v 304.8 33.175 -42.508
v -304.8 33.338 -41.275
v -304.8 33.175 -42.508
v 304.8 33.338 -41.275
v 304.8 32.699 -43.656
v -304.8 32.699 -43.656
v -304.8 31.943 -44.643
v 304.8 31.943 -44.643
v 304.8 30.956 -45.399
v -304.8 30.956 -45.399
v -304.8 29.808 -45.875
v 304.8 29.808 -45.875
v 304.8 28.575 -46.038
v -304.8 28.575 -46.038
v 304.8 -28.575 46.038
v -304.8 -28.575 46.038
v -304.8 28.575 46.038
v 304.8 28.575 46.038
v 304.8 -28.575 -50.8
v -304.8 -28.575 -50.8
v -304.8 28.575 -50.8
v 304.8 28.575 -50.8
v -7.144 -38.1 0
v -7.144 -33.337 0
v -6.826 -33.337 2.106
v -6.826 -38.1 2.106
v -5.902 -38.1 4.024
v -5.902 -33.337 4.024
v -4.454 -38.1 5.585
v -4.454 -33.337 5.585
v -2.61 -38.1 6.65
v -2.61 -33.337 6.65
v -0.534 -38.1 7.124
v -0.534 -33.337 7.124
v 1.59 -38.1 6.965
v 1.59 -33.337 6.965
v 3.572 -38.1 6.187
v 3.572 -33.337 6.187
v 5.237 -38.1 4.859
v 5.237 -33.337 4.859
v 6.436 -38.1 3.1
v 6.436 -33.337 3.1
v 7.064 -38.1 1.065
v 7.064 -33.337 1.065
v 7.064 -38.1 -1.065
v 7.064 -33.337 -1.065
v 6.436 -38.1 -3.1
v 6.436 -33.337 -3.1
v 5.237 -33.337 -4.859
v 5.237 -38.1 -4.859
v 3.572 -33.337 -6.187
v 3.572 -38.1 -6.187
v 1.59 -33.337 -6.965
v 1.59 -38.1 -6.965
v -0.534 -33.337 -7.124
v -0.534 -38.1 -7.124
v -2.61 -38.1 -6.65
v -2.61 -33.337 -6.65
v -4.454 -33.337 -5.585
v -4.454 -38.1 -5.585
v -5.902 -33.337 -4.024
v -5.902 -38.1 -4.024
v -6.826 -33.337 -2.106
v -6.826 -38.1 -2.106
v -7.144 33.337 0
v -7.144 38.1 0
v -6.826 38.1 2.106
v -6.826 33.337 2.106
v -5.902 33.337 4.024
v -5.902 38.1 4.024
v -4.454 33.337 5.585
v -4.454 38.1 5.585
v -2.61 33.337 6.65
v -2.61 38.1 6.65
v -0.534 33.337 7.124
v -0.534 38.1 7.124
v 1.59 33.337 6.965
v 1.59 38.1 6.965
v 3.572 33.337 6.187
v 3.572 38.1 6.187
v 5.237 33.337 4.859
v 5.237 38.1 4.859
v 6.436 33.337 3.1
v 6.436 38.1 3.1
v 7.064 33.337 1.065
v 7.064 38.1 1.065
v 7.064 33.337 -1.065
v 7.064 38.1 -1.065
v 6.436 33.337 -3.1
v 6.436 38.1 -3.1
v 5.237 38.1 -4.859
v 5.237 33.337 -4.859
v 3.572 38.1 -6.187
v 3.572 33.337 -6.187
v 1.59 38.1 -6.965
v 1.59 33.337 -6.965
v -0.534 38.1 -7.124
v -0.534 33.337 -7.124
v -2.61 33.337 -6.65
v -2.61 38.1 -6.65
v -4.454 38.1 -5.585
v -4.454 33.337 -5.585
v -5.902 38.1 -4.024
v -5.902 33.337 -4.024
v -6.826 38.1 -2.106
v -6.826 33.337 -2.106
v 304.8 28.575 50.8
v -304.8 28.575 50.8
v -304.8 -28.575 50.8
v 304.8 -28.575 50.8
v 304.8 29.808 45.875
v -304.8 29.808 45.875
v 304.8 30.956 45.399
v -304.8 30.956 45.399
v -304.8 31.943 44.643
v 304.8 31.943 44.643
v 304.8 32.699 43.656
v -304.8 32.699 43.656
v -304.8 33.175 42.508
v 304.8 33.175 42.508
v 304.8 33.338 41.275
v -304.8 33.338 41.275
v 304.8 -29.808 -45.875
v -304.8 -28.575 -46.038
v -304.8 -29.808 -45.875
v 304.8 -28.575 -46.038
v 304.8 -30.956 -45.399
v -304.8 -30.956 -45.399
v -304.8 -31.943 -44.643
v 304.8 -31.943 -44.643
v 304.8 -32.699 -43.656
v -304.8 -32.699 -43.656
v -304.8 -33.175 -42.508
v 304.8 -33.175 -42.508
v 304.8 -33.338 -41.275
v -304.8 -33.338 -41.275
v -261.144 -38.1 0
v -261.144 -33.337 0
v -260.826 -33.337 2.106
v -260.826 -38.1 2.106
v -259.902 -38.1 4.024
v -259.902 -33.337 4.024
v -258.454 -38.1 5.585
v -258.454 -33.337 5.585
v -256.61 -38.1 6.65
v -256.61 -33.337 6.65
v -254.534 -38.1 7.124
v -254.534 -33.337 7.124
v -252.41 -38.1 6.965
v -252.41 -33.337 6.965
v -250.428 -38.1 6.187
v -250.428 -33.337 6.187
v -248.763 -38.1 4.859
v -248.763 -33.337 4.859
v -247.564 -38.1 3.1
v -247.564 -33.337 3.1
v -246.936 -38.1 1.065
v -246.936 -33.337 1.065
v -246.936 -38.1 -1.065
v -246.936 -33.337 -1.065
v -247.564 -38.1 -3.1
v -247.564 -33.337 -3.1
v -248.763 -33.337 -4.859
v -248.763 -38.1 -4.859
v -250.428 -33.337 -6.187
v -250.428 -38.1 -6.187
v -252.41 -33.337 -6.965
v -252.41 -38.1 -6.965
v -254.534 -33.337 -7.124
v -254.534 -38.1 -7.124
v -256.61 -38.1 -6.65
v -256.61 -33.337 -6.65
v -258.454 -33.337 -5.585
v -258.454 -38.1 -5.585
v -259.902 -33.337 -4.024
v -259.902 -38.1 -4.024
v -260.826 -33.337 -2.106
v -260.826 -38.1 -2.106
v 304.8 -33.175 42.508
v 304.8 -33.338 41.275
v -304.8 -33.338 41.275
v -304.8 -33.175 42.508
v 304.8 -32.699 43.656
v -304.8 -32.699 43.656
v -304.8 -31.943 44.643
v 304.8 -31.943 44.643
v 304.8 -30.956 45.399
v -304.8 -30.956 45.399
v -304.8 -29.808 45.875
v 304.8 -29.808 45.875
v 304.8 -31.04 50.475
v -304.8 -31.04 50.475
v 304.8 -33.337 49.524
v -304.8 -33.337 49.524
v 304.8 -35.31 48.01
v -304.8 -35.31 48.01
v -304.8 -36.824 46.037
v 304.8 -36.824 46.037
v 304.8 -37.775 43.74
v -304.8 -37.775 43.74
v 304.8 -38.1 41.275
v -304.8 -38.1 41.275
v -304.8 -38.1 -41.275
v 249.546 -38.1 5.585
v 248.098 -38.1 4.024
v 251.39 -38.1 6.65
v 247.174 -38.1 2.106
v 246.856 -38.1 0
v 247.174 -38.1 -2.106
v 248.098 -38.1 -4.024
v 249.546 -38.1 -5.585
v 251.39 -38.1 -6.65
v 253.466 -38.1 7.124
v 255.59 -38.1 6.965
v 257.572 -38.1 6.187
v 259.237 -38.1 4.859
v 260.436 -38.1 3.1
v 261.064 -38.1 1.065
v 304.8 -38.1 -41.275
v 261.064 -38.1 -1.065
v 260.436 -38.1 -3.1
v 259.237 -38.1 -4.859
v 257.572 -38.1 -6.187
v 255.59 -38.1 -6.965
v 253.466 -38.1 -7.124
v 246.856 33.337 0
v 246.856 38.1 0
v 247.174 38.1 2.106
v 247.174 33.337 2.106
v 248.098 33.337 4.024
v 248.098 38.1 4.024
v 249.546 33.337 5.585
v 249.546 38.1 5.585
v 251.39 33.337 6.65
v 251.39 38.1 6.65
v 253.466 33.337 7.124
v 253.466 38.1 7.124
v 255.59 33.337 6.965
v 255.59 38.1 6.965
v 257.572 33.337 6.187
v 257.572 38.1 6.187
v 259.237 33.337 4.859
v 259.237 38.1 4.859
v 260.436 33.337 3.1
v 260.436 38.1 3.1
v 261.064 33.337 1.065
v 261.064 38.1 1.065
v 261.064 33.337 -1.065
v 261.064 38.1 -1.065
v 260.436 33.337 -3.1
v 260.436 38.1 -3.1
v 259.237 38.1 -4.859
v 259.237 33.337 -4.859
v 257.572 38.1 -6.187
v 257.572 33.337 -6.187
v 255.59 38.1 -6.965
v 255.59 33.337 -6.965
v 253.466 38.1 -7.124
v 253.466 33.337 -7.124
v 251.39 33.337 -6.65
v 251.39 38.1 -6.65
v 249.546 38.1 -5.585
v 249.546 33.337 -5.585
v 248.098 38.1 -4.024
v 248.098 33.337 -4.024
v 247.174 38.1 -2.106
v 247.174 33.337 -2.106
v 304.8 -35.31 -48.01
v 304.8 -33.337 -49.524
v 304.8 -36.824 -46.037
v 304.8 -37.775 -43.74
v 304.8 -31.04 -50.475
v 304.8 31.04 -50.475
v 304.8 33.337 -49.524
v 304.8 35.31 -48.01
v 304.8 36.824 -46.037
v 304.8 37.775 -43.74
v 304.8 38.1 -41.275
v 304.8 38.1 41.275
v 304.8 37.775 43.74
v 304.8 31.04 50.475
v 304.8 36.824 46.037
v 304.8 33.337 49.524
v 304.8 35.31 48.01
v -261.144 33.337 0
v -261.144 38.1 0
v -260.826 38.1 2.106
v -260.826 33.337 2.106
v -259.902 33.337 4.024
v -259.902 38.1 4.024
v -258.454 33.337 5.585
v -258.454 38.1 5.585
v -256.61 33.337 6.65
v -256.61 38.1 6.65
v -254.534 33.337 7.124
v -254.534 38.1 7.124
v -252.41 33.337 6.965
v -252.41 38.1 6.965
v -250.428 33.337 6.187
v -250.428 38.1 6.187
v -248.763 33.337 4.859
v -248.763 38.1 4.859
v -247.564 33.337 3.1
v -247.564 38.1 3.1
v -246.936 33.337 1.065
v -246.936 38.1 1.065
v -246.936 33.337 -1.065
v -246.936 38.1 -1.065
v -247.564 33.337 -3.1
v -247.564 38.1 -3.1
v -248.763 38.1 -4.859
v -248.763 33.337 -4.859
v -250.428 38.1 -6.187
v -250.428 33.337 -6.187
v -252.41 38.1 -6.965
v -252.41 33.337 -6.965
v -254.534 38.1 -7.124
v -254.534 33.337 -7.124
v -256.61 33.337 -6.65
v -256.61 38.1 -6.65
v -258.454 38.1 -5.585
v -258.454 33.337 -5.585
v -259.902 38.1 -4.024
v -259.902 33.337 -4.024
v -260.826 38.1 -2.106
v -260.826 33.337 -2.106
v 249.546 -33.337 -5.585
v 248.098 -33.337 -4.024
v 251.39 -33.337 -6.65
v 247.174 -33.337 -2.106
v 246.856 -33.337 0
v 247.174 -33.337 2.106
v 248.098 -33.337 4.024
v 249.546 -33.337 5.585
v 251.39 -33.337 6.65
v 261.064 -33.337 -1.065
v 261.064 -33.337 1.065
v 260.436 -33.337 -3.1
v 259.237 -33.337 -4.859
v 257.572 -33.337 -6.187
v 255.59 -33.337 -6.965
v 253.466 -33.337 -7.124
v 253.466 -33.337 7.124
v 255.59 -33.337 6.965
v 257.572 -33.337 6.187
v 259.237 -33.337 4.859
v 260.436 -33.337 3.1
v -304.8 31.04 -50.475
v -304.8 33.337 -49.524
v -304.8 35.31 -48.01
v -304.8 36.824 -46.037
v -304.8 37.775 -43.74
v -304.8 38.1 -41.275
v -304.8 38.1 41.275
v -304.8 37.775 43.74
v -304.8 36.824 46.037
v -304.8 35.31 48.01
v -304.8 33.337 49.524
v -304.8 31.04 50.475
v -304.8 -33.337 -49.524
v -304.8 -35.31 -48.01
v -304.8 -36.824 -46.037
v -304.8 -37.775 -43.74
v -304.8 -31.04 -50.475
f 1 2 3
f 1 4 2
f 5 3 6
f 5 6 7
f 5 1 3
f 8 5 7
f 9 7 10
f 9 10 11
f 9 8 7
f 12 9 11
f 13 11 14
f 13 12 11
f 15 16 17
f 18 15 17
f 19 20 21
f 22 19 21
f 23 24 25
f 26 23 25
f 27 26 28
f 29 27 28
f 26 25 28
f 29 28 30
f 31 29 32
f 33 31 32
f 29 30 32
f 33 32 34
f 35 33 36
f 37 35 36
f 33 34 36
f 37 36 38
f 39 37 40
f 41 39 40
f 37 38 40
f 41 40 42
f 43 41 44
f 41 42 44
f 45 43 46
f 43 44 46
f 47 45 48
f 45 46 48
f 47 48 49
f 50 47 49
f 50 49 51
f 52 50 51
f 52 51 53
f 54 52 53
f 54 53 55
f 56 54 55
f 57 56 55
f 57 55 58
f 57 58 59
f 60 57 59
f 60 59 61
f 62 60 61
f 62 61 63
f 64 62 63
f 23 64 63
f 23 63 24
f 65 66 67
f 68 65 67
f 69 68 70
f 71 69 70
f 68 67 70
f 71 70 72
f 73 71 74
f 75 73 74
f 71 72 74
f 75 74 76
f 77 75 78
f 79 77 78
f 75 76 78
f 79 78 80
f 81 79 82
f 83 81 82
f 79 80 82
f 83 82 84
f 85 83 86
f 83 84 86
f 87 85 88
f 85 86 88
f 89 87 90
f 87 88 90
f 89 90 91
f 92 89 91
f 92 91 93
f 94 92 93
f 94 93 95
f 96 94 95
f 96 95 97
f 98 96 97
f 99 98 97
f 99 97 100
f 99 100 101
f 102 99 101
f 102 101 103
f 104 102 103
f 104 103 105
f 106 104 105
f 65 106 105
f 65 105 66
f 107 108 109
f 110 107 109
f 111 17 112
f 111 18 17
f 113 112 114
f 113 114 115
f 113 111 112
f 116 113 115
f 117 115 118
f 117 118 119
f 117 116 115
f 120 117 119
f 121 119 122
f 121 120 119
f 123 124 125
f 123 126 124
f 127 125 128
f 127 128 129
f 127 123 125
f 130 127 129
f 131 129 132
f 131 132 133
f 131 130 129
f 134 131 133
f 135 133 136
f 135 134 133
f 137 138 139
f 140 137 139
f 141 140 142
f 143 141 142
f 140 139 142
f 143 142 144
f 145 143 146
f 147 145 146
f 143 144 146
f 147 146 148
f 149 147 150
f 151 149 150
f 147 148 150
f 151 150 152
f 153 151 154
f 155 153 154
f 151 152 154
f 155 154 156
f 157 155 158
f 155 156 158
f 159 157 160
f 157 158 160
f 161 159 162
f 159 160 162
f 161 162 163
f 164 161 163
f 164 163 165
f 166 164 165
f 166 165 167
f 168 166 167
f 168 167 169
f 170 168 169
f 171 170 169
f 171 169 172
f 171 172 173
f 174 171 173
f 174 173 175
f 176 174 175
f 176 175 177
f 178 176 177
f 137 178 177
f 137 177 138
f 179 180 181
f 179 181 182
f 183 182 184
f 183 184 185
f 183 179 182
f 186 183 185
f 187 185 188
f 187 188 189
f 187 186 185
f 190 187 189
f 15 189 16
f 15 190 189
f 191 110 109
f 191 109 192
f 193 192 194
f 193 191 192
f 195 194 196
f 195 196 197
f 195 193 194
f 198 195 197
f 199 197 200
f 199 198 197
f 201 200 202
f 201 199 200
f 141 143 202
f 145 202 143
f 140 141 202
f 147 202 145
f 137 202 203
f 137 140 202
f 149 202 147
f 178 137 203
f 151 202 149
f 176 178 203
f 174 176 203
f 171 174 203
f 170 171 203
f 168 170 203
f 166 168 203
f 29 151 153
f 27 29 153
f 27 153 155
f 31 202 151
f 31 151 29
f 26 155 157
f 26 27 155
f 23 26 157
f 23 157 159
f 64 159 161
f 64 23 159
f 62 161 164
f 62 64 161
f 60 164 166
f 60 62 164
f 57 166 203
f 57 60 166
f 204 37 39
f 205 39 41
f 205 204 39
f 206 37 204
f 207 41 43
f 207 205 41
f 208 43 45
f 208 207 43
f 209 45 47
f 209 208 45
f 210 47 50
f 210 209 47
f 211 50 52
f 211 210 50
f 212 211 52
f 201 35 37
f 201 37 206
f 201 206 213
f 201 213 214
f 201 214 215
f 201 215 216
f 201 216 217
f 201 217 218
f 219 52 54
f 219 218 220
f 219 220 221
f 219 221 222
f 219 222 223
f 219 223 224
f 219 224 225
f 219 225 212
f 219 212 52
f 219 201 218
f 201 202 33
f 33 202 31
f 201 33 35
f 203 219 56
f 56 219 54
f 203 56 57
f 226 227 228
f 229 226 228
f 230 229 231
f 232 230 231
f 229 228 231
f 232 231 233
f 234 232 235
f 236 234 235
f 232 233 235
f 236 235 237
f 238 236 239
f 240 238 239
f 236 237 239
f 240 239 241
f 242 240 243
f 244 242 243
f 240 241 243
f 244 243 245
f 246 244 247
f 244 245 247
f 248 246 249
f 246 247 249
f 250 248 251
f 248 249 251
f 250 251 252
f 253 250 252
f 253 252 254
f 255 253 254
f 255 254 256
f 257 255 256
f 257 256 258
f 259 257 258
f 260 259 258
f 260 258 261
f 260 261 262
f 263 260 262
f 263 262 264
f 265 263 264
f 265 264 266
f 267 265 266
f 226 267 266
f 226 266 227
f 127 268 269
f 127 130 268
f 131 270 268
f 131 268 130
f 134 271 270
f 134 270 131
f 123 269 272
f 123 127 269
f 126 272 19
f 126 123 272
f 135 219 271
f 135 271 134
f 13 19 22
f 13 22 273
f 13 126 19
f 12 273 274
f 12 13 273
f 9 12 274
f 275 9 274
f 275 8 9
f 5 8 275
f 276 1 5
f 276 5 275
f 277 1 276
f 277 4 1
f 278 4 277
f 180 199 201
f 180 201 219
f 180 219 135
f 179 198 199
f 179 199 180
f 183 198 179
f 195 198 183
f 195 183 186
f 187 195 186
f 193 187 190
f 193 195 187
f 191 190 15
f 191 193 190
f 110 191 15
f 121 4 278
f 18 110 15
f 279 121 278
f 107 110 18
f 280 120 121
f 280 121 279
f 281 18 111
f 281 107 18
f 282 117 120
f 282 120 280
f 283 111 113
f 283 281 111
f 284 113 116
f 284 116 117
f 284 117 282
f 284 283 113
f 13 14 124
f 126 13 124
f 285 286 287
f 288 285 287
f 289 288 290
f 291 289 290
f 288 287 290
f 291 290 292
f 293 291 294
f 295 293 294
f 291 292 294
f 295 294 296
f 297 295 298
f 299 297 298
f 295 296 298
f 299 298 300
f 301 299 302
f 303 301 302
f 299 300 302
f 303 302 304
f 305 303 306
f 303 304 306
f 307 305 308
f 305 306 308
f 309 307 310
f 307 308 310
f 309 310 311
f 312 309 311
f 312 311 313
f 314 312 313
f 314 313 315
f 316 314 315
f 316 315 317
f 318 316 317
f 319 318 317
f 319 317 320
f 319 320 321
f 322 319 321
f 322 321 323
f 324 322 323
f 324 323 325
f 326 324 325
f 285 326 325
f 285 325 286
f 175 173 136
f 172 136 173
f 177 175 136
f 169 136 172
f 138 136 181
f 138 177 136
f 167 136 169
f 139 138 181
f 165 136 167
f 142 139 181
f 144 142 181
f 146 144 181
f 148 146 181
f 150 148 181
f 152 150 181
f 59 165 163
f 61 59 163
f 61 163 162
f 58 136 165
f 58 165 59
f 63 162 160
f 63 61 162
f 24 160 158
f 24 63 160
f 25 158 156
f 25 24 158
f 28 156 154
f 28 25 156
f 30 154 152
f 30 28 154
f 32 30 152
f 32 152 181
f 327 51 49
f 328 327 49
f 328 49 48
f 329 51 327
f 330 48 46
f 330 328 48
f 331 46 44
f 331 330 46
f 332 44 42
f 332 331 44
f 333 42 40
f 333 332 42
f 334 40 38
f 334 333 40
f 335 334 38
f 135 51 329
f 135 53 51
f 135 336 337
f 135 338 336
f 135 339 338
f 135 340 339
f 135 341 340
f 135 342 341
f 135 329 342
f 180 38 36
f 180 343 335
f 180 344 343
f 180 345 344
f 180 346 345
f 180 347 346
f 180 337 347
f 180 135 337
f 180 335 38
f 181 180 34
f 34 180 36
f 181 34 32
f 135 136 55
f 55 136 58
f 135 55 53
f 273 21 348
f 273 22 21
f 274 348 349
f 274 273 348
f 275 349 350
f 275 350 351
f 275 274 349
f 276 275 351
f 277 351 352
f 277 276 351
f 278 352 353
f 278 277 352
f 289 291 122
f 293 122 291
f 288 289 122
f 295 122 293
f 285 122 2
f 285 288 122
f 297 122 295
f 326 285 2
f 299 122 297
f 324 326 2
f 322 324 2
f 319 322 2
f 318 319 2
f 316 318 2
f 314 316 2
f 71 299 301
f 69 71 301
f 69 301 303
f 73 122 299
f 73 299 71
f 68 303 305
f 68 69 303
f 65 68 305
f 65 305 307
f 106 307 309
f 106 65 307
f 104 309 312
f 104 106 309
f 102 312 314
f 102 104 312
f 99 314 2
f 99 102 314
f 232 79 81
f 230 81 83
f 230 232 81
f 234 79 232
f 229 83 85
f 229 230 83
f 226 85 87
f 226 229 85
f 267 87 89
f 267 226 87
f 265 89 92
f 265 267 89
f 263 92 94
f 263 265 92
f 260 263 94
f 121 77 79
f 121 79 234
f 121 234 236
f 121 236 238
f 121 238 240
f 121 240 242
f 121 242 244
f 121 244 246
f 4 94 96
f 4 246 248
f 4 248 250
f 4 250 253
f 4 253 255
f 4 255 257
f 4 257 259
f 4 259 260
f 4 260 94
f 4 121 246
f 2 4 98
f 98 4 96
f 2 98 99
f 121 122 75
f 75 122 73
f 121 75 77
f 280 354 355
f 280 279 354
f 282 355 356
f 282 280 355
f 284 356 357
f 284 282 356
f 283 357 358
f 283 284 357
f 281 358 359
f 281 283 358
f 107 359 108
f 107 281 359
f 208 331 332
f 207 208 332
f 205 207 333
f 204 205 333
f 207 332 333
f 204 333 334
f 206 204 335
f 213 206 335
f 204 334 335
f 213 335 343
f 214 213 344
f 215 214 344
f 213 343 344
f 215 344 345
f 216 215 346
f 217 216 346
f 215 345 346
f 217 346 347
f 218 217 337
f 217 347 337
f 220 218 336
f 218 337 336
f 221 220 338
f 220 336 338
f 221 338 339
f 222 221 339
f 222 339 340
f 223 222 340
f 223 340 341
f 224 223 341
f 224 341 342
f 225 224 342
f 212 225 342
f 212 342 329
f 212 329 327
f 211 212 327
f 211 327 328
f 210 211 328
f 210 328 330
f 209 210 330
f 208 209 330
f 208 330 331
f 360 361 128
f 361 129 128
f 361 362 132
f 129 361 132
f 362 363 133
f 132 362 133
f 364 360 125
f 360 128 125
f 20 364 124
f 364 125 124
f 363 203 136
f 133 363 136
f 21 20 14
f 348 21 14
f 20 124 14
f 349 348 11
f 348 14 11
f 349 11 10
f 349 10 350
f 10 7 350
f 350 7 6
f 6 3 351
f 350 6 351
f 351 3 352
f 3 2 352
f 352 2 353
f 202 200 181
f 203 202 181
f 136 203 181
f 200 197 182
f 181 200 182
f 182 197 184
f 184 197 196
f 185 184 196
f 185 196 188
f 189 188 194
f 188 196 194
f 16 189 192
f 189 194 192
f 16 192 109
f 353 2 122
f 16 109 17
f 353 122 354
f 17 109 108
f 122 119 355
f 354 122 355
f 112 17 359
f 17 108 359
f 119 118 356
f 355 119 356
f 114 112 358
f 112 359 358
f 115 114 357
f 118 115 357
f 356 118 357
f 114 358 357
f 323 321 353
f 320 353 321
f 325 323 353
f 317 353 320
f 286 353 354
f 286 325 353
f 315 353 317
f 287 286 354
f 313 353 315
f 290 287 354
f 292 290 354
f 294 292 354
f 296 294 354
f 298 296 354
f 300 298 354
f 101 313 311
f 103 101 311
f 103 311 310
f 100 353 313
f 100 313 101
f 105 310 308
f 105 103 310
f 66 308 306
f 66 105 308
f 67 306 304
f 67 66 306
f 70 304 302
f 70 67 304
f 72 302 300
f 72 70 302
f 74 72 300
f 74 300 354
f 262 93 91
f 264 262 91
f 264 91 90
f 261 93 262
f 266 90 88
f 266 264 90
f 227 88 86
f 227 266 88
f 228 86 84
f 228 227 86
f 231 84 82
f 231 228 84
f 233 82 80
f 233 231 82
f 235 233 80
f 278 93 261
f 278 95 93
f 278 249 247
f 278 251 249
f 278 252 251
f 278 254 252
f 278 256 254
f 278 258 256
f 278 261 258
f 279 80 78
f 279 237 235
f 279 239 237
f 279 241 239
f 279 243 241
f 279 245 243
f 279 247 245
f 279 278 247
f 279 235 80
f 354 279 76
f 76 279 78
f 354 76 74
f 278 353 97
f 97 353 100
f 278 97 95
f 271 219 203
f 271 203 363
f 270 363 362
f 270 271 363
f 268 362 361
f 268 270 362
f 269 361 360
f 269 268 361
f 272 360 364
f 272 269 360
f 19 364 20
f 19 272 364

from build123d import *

# Parameters (mm, degrees)
F2_DEPTH = 304.8
F4_D     = 14.2875


# Not quite as in the source:
# - a variable given as a bare number and used for a length is read in inches; the dataset says mm whatever the document's units were


with BuildPart() as f2:
    # F1 (on Right) → F2 (new body, symmetric)
    with BuildSketch(Plane.YZ):
        with BuildLine():
            Line((28.575, 50.8), (-28.575, 50.8))
            ThreePointArc((-28.575, 50.8), (-35.3101920908, 48.0101920908), (-38.1, 41.275))
            Line((-38.1, 41.275), (-38.1, -41.275))
            ThreePointArc((-38.1, -41.275), (-35.3101920908, -48.0101920908), (-28.575, -50.8))
            Line((-28.575, -50.8), (28.575, -50.8))
            ThreePointArc((28.575, -50.8), (35.3101920908, -48.0101920908), (38.1, -41.275))
            Line((38.1, -41.275), (38.1, 41.275))
            ThreePointArc((38.1, 41.275), (35.3101920908, 48.0101920908), (28.575, 50.8))
        make_face()
        with BuildLine():
            ThreePointArc((-33.3375, 41.275), (-31.9425960454, 44.6425960454), (-28.575, 46.0375))
            Line((-28.575, 46.0375), (28.575, 46.0375))
            ThreePointArc((28.575, 46.0375), (31.9425960454, 44.6425960454), (33.3375, 41.275))
            Line((33.3375, 41.275), (33.3375, -41.275))
            ThreePointArc((33.3375, -41.275), (31.9425960454, -44.6425960454), (28.575, -46.0375))
            Line((28.575, -46.0375), (-28.575, -46.0375))
            ThreePointArc((-28.575, -46.0375), (-31.9425960454, -44.6425960454), (-33.3375, -41.275))
            Line((-33.3375, -41.275), (-33.3375, 41.275))
        make_face(mode=Mode.SUBTRACT)
    extrude(amount=F2_DEPTH, both=True)

    # F4 (through all)
    with Locations(Plane.XZ.offset(38.1)):
        with Locations((-254, 0), (0, 0), (254, 0)):
            Hole(F4_D / 2)


solid = f2.part
